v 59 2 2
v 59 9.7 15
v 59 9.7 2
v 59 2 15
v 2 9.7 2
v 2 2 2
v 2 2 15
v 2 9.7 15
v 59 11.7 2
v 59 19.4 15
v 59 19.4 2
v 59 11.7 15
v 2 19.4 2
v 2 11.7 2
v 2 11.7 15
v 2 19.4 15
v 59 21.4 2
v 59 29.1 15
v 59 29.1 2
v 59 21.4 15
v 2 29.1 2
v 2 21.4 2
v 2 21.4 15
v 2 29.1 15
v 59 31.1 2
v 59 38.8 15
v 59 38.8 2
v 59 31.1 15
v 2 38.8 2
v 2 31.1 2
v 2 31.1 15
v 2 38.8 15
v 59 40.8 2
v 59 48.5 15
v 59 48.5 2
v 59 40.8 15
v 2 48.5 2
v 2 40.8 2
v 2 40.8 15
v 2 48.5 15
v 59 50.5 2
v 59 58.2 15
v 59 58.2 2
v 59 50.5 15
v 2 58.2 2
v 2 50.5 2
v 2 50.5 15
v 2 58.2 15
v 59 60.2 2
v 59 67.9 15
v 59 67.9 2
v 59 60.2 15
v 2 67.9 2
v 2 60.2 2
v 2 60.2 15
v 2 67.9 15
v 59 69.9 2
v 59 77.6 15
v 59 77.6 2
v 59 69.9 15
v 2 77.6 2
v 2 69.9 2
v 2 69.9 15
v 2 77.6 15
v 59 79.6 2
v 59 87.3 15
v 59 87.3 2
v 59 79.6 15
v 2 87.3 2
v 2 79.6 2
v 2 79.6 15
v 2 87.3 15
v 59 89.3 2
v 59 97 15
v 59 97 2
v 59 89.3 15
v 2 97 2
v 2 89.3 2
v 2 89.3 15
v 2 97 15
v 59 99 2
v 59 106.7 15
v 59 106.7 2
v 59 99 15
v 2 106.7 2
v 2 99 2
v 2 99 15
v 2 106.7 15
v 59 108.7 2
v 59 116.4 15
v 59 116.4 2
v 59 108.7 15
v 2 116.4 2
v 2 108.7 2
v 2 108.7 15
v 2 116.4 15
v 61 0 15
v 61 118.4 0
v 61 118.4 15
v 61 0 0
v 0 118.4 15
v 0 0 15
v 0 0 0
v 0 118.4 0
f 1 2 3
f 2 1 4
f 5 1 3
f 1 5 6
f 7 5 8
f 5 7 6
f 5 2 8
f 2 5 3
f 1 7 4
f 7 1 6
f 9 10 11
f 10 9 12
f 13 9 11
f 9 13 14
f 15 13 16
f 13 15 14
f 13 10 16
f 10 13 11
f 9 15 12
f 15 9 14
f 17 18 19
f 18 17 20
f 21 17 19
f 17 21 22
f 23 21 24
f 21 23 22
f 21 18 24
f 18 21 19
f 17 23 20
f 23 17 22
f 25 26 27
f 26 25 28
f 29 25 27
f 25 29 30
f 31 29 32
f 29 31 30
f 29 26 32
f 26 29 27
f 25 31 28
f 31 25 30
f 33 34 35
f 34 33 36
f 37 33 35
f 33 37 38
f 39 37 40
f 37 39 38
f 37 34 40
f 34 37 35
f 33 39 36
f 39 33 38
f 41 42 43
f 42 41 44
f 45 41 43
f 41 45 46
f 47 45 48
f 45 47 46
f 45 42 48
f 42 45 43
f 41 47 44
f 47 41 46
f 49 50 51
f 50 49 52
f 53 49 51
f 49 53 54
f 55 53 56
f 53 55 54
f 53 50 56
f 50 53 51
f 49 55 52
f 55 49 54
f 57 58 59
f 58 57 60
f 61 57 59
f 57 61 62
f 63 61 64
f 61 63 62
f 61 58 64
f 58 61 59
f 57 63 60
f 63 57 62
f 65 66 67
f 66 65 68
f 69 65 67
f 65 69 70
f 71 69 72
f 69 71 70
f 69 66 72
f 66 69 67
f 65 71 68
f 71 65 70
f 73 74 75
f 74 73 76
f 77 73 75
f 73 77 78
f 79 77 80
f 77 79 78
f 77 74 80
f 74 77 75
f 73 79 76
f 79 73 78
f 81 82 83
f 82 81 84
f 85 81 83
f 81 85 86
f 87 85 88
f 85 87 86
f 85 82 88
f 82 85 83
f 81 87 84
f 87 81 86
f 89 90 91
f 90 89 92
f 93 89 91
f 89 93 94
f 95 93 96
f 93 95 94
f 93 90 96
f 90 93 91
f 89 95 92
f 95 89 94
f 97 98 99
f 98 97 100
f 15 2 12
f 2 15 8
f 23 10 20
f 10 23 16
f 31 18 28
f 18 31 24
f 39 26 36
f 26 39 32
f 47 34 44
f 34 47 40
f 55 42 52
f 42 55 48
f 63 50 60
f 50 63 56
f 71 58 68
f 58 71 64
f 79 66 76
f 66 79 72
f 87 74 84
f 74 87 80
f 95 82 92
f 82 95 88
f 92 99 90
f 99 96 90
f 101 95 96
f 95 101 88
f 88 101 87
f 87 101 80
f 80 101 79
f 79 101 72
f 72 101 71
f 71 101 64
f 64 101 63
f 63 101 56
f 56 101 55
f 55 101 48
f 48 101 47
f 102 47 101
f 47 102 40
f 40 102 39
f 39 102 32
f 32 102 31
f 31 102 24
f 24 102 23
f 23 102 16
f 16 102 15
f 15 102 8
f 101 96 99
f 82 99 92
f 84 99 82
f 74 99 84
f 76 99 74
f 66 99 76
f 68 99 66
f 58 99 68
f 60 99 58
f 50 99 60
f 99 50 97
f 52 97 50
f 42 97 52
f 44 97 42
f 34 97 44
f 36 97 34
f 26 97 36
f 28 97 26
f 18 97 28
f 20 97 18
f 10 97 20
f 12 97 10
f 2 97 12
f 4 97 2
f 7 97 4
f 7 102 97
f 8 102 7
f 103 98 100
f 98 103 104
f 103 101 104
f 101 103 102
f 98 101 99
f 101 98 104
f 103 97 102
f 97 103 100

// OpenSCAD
/*********************************************
 * Basic Parameters -- Adjust these to taste *
 *********************************************/
// Number of Cartridges to hold
cart_count = 12;

/***************************************************
 * Holder design -- You can generally ignore these *
 ***************************************************/
holder_height       = 15;
perimeter_thickness = 2;
divider_thickness   = 2;

/************************
 * Cartridge Dimensions *
 ************************/
/* (Only adjust if your carts don't fit for some reason
 * or you want to use this code for a different style of
 * cartridge.
 */
cart_depth          = 7.7; // Nominal 7.6
cart_width          = 57;   // Nominal 56.8;
// cart_wall_thickness = 1.3;

/***********************
 * Let's Get Dangerous *
 ***********************/
overall_width = cart_width + (2 * perimeter_thickness);
overall_length = cart_count * (cart_depth + divider_thickness) - divider_thickness + (2 * perimeter_thickness);

difference() {
    cube([overall_width, overall_length, holder_height]);
    for(i = [0:cart_count-1]) {
        translate([
            perimeter_thickness,
            perimeter_thickness + (divider_thickness + cart_depth) * i,
            perimeter_thickness
        ])
            cube([cart_width, cart_depth, holder_height]);
    }
}
